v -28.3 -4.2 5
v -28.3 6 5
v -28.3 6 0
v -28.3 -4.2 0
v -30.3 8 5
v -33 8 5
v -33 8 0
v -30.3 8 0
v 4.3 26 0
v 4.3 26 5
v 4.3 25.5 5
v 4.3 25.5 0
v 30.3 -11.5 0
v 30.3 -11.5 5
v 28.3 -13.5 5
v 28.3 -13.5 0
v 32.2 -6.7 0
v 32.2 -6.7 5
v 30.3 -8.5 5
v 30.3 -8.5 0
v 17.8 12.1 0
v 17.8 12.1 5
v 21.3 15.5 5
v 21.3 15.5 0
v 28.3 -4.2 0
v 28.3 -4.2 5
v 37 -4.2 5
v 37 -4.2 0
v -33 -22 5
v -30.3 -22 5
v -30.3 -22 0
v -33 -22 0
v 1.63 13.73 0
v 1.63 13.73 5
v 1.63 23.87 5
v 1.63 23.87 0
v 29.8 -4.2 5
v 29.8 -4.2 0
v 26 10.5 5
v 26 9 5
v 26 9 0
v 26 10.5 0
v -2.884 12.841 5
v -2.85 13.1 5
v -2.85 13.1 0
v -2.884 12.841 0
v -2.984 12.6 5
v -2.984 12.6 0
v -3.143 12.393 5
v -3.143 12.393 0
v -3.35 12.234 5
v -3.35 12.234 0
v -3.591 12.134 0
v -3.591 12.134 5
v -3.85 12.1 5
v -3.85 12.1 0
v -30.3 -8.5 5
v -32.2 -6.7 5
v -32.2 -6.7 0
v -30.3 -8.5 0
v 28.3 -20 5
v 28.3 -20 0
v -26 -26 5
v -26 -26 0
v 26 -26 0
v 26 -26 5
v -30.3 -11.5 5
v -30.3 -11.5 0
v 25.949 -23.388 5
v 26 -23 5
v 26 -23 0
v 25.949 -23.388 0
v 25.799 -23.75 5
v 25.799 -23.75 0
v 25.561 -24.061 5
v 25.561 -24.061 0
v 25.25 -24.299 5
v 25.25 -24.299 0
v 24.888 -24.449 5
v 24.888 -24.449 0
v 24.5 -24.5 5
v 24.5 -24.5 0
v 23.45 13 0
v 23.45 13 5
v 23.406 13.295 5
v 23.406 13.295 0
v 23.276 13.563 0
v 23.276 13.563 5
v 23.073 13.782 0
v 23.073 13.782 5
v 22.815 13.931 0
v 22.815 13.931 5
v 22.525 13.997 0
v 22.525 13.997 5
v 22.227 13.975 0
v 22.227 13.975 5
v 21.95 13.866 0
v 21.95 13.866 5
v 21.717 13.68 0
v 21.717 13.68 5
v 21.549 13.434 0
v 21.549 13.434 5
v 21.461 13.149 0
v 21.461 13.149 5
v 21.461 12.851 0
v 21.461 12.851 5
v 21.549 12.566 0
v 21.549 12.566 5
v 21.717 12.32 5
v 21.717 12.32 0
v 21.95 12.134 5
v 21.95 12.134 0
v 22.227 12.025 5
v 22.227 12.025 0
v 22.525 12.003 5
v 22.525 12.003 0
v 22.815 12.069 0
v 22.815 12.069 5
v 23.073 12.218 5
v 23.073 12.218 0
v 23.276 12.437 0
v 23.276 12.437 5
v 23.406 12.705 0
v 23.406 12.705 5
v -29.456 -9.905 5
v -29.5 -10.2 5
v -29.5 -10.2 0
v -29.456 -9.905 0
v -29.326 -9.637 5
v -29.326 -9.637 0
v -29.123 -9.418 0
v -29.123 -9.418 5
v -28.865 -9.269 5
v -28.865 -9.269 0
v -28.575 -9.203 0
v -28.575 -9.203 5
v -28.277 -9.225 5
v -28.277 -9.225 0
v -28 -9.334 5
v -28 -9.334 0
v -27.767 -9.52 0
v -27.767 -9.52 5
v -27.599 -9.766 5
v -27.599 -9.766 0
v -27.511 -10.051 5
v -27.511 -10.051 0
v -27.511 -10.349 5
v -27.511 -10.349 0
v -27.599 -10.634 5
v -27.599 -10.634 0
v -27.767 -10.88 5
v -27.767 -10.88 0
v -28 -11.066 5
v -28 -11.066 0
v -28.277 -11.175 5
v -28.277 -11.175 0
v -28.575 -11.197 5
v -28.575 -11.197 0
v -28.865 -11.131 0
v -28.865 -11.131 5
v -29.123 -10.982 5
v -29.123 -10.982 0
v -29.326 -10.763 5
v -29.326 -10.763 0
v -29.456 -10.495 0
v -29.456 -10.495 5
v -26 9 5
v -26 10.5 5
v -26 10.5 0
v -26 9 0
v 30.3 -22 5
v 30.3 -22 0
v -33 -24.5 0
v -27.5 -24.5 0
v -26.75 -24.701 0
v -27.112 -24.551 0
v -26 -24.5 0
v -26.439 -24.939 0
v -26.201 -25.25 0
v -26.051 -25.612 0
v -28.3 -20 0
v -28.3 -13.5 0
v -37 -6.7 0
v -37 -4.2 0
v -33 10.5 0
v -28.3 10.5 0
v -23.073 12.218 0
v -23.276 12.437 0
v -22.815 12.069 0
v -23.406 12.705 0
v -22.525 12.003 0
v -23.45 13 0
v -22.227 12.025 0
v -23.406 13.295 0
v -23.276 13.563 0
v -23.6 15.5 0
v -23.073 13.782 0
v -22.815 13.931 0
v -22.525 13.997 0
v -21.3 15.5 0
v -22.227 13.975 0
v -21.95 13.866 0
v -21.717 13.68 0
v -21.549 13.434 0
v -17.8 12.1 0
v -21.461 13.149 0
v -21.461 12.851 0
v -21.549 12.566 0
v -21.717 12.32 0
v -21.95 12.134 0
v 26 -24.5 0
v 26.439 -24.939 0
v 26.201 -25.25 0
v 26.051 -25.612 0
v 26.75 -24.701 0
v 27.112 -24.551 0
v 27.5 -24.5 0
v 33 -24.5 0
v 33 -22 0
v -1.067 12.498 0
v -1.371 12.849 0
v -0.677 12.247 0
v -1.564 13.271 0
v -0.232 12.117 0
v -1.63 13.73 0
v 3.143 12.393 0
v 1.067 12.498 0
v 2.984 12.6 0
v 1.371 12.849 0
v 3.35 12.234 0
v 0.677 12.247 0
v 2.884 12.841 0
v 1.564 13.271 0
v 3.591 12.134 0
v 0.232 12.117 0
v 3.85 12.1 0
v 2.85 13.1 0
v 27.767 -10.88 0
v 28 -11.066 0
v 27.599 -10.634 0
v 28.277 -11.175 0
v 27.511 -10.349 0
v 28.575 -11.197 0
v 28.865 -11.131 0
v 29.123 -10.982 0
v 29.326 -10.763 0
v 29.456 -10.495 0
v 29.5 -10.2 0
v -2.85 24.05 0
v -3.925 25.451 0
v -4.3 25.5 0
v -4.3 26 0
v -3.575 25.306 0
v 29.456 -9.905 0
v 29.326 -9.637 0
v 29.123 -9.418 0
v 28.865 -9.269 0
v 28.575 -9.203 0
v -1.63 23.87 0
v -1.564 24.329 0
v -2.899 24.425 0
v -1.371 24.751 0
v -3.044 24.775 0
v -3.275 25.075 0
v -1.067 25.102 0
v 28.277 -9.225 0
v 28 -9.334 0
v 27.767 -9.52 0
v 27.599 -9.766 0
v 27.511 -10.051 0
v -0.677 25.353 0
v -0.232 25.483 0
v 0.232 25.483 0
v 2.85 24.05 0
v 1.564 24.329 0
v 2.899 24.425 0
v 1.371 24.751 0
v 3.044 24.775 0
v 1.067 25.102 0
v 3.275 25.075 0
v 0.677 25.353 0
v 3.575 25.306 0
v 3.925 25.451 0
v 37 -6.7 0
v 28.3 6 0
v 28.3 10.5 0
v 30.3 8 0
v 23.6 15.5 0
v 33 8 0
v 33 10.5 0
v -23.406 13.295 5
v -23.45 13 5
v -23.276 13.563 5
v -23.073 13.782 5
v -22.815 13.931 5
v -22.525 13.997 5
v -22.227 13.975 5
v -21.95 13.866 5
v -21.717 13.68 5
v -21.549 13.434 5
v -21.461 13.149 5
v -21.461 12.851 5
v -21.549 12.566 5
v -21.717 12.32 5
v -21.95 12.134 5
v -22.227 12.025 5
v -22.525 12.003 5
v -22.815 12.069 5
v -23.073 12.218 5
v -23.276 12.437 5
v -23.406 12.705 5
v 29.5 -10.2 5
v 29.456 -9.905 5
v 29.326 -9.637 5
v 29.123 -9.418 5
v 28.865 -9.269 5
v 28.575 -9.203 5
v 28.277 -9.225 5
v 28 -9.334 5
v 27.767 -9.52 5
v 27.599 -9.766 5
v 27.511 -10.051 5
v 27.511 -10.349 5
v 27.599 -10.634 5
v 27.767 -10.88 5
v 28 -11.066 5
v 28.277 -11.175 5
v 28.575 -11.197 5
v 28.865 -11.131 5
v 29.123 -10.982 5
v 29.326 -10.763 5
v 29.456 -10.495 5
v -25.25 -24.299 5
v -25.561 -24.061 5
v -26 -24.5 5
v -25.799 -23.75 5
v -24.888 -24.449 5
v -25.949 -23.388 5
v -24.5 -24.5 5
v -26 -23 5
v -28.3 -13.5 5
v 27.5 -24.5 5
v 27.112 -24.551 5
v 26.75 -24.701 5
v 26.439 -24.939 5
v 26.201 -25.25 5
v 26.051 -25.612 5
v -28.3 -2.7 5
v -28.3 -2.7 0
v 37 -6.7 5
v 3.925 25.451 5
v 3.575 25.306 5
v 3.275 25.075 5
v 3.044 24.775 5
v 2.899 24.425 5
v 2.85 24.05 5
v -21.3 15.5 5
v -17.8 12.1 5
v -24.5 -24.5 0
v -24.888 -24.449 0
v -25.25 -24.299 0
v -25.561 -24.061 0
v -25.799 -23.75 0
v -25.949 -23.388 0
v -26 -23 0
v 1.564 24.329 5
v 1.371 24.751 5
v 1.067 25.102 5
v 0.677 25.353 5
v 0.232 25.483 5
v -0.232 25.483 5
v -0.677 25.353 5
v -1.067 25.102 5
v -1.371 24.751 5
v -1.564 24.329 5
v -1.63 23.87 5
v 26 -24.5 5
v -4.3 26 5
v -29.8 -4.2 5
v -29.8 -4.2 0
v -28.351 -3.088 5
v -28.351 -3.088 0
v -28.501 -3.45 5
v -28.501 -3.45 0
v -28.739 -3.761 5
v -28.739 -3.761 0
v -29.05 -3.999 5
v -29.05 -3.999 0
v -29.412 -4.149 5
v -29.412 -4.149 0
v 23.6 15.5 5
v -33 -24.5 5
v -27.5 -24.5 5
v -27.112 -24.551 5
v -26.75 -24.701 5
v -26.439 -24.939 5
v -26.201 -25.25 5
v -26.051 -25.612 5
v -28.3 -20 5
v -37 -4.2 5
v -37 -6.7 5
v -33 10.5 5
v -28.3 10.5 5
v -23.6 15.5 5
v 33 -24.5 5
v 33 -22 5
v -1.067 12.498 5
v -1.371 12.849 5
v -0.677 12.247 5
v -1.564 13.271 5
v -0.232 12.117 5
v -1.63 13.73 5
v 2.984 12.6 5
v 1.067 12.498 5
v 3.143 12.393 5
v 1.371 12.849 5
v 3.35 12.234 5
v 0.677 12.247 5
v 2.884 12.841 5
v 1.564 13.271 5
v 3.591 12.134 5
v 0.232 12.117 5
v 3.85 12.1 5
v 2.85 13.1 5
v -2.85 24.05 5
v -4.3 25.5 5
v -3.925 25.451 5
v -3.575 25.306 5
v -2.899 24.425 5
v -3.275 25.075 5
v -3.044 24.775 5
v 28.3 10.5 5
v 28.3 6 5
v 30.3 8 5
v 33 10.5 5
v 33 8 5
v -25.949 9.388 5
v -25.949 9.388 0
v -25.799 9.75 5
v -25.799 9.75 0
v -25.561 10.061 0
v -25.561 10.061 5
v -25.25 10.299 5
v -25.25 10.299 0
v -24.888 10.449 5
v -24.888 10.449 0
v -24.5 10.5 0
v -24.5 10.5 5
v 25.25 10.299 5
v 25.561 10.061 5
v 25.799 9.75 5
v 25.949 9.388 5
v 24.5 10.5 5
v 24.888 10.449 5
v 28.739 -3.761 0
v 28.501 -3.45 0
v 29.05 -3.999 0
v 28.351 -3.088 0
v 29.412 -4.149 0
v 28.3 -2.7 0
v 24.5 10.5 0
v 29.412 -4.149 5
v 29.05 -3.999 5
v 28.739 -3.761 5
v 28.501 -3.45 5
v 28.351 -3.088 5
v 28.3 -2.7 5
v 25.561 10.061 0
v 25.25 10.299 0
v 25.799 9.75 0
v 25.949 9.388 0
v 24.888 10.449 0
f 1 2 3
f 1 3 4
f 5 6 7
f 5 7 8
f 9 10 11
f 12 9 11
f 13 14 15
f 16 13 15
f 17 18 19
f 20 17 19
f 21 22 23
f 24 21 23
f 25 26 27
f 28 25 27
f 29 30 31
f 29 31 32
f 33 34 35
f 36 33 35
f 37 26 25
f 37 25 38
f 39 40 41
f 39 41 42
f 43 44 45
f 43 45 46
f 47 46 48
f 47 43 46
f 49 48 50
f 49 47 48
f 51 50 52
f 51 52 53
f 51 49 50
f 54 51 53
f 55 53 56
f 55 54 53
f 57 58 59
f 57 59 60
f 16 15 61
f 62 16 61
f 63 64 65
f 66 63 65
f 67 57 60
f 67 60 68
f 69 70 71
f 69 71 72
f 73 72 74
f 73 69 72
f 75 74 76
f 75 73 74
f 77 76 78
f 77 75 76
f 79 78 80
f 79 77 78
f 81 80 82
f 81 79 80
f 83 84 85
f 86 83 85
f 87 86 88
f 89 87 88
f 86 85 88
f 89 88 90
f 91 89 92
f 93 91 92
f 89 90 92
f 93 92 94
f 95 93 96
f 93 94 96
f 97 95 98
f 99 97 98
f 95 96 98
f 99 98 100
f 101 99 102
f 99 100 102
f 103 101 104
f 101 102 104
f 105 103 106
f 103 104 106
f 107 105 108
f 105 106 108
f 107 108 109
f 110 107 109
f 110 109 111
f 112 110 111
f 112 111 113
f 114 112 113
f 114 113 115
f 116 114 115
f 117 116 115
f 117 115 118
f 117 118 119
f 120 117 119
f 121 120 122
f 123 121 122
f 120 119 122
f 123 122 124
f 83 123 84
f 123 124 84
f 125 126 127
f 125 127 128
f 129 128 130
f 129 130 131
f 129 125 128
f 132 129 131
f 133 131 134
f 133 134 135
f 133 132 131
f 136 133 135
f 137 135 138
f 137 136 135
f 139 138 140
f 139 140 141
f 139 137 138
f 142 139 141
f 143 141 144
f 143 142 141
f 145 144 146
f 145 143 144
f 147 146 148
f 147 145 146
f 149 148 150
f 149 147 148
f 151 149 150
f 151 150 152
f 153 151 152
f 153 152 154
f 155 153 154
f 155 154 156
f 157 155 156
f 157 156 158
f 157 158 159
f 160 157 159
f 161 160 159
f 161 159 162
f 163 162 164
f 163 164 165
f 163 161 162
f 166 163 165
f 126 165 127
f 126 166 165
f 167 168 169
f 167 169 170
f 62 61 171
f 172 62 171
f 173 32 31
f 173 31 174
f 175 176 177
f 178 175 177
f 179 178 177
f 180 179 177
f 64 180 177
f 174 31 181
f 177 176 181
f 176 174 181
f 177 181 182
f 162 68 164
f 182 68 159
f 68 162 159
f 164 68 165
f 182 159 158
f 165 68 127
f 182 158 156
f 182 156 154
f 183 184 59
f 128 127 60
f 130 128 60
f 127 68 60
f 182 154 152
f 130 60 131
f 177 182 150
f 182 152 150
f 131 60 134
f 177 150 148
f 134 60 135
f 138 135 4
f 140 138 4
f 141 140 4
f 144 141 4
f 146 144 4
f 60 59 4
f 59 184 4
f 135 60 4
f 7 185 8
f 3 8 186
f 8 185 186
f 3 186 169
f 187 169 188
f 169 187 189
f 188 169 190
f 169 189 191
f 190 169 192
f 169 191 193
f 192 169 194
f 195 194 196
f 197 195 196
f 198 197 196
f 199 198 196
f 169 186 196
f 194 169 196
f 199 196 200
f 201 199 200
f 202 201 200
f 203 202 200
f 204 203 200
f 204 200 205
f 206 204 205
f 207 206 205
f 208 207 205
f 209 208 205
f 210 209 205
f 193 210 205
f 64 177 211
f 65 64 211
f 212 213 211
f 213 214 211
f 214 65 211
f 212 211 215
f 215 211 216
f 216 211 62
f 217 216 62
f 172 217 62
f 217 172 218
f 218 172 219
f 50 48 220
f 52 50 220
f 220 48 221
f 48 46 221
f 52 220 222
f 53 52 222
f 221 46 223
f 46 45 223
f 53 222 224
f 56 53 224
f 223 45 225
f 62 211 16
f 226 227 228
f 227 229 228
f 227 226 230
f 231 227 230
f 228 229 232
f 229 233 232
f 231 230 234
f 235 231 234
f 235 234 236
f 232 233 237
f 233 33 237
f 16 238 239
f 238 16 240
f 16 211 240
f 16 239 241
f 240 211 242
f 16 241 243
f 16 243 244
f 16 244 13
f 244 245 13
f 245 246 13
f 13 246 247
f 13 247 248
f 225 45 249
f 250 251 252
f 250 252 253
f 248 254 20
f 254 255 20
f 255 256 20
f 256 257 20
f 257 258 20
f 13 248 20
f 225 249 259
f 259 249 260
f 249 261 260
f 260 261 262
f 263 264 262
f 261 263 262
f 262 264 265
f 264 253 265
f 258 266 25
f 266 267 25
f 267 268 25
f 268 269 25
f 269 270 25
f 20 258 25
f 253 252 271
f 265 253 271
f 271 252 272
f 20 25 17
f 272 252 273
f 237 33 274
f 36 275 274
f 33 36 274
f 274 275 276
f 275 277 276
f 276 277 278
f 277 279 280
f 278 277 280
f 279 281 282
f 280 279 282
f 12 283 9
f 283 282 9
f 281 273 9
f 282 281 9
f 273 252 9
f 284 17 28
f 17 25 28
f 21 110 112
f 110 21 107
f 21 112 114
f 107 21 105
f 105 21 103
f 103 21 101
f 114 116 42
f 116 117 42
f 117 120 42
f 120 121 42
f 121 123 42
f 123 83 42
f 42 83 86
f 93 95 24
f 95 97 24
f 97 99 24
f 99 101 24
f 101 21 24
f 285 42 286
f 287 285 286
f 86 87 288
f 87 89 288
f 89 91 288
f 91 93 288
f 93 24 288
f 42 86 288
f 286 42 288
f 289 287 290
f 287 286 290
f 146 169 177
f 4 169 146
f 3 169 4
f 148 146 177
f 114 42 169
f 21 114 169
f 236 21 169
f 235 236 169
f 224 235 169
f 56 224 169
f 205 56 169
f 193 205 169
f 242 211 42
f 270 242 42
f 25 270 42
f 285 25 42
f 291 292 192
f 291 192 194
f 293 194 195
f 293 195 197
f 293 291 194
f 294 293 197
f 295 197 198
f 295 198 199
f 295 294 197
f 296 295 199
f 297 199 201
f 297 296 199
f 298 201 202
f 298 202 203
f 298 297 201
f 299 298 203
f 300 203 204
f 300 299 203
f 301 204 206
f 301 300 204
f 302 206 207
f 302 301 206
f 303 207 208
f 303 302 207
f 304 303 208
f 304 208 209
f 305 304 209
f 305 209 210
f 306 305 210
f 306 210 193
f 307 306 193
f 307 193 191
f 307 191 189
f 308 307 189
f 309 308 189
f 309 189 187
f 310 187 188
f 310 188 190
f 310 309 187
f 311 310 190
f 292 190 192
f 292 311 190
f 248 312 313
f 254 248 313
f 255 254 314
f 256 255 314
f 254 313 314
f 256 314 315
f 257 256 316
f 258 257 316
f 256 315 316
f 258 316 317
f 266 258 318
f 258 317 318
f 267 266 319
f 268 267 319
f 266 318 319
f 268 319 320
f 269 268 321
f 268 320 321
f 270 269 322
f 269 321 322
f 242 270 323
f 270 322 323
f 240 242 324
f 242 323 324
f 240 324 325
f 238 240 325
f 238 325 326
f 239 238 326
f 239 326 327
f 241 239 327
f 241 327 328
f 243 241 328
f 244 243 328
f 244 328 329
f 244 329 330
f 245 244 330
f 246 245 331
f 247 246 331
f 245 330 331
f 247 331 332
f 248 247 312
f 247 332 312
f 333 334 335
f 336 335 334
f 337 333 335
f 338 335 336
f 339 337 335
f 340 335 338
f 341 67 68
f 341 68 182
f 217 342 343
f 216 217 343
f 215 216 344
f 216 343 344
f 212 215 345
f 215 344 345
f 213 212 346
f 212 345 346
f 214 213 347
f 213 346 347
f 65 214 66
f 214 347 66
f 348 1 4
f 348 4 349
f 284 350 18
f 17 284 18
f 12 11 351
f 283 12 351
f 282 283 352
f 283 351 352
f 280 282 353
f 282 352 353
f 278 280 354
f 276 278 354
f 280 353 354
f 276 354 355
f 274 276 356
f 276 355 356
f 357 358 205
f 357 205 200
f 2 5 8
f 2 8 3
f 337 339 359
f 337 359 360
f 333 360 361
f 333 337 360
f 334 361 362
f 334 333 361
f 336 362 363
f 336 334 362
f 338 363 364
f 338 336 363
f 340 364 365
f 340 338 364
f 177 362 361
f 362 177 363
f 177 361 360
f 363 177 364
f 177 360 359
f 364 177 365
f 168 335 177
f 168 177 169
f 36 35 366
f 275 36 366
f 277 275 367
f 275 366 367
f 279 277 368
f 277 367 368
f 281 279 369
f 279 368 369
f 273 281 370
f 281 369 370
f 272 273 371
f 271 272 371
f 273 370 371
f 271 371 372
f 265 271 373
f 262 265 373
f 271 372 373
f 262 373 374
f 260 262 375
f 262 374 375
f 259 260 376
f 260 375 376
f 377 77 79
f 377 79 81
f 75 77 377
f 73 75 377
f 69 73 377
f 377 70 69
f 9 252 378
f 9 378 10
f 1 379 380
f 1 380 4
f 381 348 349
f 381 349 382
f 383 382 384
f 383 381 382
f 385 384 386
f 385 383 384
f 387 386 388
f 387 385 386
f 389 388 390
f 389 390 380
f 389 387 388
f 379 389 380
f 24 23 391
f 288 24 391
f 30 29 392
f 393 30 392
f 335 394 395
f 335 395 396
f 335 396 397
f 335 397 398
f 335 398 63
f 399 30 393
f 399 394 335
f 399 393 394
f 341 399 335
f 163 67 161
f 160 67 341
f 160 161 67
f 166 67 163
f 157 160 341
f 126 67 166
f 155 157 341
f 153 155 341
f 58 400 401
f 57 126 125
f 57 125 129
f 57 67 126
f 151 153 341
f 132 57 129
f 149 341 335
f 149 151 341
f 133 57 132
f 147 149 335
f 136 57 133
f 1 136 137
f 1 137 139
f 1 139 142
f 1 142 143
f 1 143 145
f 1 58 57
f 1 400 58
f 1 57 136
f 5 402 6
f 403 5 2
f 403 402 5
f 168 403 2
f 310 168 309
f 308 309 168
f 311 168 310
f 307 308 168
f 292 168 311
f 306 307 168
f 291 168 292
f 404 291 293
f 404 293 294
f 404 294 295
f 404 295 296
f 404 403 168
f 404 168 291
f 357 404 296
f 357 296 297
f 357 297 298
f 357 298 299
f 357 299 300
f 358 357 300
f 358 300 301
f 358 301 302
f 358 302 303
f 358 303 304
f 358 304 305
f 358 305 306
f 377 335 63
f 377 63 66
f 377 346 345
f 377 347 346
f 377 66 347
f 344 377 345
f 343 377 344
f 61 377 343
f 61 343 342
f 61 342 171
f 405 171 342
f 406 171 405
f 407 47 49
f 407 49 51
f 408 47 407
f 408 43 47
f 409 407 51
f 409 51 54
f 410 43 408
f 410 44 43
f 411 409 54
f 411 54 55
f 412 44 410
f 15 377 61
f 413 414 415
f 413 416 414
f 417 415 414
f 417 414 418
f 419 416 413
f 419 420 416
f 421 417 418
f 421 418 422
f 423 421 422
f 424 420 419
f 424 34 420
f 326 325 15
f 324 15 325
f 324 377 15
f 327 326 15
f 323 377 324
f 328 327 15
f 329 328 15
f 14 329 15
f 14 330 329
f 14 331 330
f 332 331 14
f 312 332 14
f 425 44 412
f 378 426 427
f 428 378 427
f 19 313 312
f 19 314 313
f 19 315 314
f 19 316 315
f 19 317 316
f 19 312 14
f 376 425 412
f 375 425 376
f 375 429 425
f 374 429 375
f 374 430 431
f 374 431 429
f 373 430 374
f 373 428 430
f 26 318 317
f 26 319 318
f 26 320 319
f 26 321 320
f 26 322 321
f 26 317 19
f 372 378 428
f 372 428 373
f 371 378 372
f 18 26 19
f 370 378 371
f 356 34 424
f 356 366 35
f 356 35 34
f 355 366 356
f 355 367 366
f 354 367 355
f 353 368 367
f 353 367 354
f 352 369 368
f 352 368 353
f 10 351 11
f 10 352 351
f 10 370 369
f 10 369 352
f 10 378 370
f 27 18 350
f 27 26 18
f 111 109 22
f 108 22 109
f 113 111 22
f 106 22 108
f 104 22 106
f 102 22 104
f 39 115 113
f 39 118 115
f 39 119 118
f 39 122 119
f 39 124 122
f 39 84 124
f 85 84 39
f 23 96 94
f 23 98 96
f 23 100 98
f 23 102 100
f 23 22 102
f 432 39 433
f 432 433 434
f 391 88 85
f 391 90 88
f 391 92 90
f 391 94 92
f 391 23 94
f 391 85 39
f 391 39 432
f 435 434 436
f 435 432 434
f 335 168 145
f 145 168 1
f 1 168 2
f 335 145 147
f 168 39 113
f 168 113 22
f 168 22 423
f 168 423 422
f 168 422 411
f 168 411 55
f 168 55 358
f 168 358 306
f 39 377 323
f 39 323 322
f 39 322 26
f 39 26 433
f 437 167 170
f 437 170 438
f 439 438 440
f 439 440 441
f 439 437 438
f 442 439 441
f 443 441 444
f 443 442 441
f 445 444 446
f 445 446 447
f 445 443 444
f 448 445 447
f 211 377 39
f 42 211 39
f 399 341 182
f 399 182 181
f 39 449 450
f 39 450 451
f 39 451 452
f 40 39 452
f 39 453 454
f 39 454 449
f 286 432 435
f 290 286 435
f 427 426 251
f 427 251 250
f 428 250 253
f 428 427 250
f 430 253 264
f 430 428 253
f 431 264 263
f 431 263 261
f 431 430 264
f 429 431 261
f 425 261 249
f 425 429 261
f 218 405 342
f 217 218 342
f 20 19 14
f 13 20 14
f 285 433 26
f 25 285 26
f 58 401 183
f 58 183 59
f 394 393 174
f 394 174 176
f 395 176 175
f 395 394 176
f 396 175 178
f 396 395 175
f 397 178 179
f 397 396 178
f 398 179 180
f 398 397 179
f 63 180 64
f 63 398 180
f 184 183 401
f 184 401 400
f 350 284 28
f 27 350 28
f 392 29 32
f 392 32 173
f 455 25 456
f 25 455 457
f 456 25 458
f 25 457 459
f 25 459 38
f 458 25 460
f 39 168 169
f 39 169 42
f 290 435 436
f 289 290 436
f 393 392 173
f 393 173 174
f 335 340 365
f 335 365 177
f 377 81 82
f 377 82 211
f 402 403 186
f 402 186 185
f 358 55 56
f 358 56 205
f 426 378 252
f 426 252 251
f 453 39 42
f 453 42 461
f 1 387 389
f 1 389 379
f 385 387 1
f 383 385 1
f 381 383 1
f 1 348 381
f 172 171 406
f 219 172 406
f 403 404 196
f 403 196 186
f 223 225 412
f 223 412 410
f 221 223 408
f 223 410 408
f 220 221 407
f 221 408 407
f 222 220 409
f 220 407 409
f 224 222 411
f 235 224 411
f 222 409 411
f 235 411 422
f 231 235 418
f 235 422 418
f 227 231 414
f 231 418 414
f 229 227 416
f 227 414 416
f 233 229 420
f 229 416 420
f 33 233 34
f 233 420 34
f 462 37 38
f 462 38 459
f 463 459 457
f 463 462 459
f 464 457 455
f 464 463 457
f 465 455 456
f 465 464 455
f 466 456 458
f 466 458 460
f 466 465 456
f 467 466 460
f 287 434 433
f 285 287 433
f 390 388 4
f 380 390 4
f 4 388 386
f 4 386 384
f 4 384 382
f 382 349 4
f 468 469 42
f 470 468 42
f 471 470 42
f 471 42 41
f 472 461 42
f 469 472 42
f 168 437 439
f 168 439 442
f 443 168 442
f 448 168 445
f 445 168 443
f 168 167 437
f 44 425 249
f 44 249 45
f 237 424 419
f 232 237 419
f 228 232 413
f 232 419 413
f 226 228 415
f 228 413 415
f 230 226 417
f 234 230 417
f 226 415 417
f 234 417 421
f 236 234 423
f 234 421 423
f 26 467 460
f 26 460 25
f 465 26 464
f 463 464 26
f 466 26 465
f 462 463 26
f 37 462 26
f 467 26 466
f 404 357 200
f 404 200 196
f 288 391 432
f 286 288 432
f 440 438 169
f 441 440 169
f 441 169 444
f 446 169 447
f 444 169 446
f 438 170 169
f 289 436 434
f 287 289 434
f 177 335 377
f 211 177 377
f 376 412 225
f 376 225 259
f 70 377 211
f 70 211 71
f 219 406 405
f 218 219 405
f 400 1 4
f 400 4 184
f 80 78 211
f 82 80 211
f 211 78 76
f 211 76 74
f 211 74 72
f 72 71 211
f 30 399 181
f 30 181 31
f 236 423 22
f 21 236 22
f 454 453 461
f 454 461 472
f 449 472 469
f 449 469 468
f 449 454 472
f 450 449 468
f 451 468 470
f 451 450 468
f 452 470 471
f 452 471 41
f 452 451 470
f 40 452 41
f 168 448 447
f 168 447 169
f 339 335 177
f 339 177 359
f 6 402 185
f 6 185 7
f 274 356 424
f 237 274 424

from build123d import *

# Parameters (mm, degrees)
CROQUIS1_W                = 74
CROQUIS1_H                = 52
SALIENTE_EXTRUIR1_DEPTH   = 5
CROQUIS2_W                = 52
CROQUIS2_H                = 35
CORTAR_EXTRUIR1_DEPTH     = 5
CROQUIS3_R                = 1
CROQUIS3_R_2              = 1.45
CROQUIS3_R_3              = 1.63
CORTAR_EXTRUIR2_DEPTH     = 5
SALIENTE_EXTRUIR2_DEPTH   = 5
SALIENTE_EXTRUIR2_2_DEPTH = 5
SALIENTE_EXTRUIR2_3_DEPTH = 5
SALIENTE_EXTRUIR2_4_DEPTH = 5
SALIENTE_EXTRUIR2_5_DEPTH = 5
SALIENTE_EXTRUIR2_6_DEPTH = 5


with BuildPart() as part:
    # Croquis1 → Saliente-Extruir1 (new body)
    with BuildSketch(Plane.XY):
        Rectangle(CROQUIS1_W, CROQUIS1_H)
    extrude(amount=SALIENTE_EXTRUIR1_DEPTH)

    # Croquis2 → Cortar-Extruir1 (cut)
    with BuildSketch(Plane.XY.offset(5)):
        with Locations((0, -7)):
            Rectangle(CROQUIS2_W, CROQUIS2_H)
    extrude(amount=-CORTAR_EXTRUIR1_DEPTH, mode=Mode.SUBTRACT)

    # Croquis3 → Cortar-Extruir2 (cut)
    with BuildSketch(Plane.XY.offset(5)):
        with BuildLine():
            Line((33, -22), (33, -24.5))
            Line((33, -24.5), (27.5, -24.5))
            ThreePointArc((27.5, -24.5), (28.560660172, -24.939339828), (29, -26))
            Line((29, -26), (37, -26))
            Line((37, -26), (37, -6.7))
            Line((37, -6.7), (32.2, -6.7))
            Line((32.2, -6.7), (30.3, -8.5))
            Line((30.3, -8.5), (30.3, -11.5))
            Line((30.3, -11.5), (28.3, -13.5))
            Line((28.3, -13.5), (28.3, -20))
            Line((28.3, -20), (30.3, -22))
            Line((30.3, -22), (33, -22))
        make_face()
        with BuildLine():
            ThreePointArc((29, -26), (28.560660172, -24.939339828), (27.5, -24.5))
            ThreePointArc((27.5, -24.5), (26.439339828, -24.939339828), (26, -26))
            Line((26, -26), (29, -26))
        make_face()
        with BuildLine():
            ThreePointArc((26, -26), (27.5, -27.5), (29, -26))
            Line((29, -26), (26, -26))
        make_face()
        with BuildLine():
            Line((28.3, -4.2), (37, -4.2))
            Line((37, -4.2), (37, 26))
            Line((37, 26), (4.3, 26))
            Line((4.3, 26), (4.3, 25.5))
            ThreePointArc((4.3, 25.5), (5.325304833, 25.075304833), (5.75, 24.05))
            ThreePointArc((5.75, 24.05), (4.3, 22.6), (2.85, 24.05))
            Line((2.85, 24.05), (2.85, 13.1))
            ThreePointArc((2.85, 13.1), (3.85, 14.1), (4.85, 13.1))
            ThreePointArc((4.85, 13.1), (4.557106781, 12.392893219), (3.85, 12.1))
            Line((3.85, 12.1), (17.8, 12.1))
            Line((17.8, 12.1), (21.3, 15.5))
            Line((21.3, 15.5), (23.6, 15.5))
            Line((23.6, 15.5), (28.3, 10.5))
            Line((28.3, 10.5), (33, 10.5))
            Line((33, 10.5), (33, 8))
            Line((33, 8), (30.3, 8))
            Line((30.3, 8), (28.3, 6))
            Line((28.3, 6), (28.3, -4.2))
        make_face()
        with Locations((3.85, 13.1)):
            Circle(CROQUIS3_R)
        with Locations((4.3, 24.05)):
            Circle(CROQUIS3_R_2)
        with BuildLine():
            Line((0, 22.24), (0, 15.36))
            ThreePointArc((0, 15.36), (1.152584053, 14.882584053), (1.63, 13.73))
            Line((1.63, 13.73), (1.63, 23.87))
            ThreePointArc((1.63, 23.87), (1.152584053, 22.717415947), (0, 22.24))
        make_face()
        with Locations((0, 23.87)):
            Circle(CROQUIS3_R_3)
        with Locations((0, 13.73)):
            Circle(CROQUIS3_R_3)
        with Locations((22.45, 13)):
            Circle(CROQUIS3_R)
        with Locations((28.5, -10.2)):
            Circle(CROQUIS3_R)
    cortar_extruir2 = extrude(amount=-CORTAR_EXTRUIR2_DEPTH, mode=Mode.SUBTRACT)

    # Simetría2: Cortar-Extruir2 across plane
    add(cortar_extruir2.mirror(Plane.ZY), mode=Mode.SUBTRACT)


with BuildPart() as body_2:
    # Croquis4 → Saliente-Extruir2 (new body)
    with BuildSketch(Plane.XY.offset(5)):
        with BuildLine():
            ThreePointArc((-26, 9), (-25.560660172, 10.060660172), (-24.5, 10.5))
            Line((-24.5, 10.5), (-26, 10.5))
            Line((-26, 10.5), (-26, 9))
        make_face()
    extrude(amount=-SALIENTE_EXTRUIR2_DEPTH)


with BuildPart() as body_3:
    # Croquis4 → Saliente-Extruir2 2 (new body)
    with BuildSketch(Plane.XY.offset(5)):
        with BuildLine():
            Line((-29.8, -4.2), (-28.3, -4.2))
            Line((-28.3, -4.2), (-28.3, -2.7))
            ThreePointArc((-28.3, -2.7), (-28.739339828, -3.760660172), (-29.8, -4.2))
        make_face()
    extrude(amount=-SALIENTE_EXTRUIR2_2_DEPTH)


with BuildPart() as body_4:
    # Croquis4 → Saliente-Extruir2 3 (new body)
    with BuildSketch(Plane.XY.offset(5)):
        with BuildLine():
            ThreePointArc((-24.5, -24.5), (-25.560660178, -24.060660166), (-26, -22.999999983))
            Line((-26, -22.999999983), (-26, -24.5))
            Line((-26, -24.5), (-24.5, -24.5))
        make_face()
    extrude(amount=-SALIENTE_EXTRUIR2_3_DEPTH)


with BuildPart() as body_5:
    # Croquis4 → Saliente-Extruir2 4 (new body)
    with BuildSketch(Plane.XY.offset(5)):
        with BuildLine():
            Line((26, -24.5), (26, -23))
            ThreePointArc((26, -23), (25.560660172, -24.060660172), (24.5, -24.5))
            Line((24.5, -24.5), (26, -24.5))
        make_face()
    extrude(amount=-SALIENTE_EXTRUIR2_4_DEPTH)


with BuildPart() as body_6:
    # Croquis4 → Saliente-Extruir2 5 (new body)
    with BuildSketch(Plane.XY.offset(5)):
        with BuildLine():
            Line((28.3, -2.7), (28.3, -4.2))
            Line((28.3, -4.2), (29.8, -4.2))
            ThreePointArc((29.8, -4.2), (28.739339828, -3.760660172), (28.3, -2.7))
        make_face()
    extrude(amount=-SALIENTE_EXTRUIR2_5_DEPTH)


with BuildPart() as body_7:
    # Croquis4 → Saliente-Extruir2 6 (new body)
    with BuildSketch(Plane.XY.offset(5)):
        with BuildLine():
            Line((26, 9), (26, 10.5))
            Line((26, 10.5), (24.5, 10.5))
            ThreePointArc((24.5, 10.5), (25.560660172, 10.060660172), (26, 9))
        make_face()
    extrude(amount=-SALIENTE_EXTRUIR2_6_DEPTH)


solid = Compound([part.part, body_2.part, body_3.part, body_4.part, body_5.part, body_6.part, body_7.part])
